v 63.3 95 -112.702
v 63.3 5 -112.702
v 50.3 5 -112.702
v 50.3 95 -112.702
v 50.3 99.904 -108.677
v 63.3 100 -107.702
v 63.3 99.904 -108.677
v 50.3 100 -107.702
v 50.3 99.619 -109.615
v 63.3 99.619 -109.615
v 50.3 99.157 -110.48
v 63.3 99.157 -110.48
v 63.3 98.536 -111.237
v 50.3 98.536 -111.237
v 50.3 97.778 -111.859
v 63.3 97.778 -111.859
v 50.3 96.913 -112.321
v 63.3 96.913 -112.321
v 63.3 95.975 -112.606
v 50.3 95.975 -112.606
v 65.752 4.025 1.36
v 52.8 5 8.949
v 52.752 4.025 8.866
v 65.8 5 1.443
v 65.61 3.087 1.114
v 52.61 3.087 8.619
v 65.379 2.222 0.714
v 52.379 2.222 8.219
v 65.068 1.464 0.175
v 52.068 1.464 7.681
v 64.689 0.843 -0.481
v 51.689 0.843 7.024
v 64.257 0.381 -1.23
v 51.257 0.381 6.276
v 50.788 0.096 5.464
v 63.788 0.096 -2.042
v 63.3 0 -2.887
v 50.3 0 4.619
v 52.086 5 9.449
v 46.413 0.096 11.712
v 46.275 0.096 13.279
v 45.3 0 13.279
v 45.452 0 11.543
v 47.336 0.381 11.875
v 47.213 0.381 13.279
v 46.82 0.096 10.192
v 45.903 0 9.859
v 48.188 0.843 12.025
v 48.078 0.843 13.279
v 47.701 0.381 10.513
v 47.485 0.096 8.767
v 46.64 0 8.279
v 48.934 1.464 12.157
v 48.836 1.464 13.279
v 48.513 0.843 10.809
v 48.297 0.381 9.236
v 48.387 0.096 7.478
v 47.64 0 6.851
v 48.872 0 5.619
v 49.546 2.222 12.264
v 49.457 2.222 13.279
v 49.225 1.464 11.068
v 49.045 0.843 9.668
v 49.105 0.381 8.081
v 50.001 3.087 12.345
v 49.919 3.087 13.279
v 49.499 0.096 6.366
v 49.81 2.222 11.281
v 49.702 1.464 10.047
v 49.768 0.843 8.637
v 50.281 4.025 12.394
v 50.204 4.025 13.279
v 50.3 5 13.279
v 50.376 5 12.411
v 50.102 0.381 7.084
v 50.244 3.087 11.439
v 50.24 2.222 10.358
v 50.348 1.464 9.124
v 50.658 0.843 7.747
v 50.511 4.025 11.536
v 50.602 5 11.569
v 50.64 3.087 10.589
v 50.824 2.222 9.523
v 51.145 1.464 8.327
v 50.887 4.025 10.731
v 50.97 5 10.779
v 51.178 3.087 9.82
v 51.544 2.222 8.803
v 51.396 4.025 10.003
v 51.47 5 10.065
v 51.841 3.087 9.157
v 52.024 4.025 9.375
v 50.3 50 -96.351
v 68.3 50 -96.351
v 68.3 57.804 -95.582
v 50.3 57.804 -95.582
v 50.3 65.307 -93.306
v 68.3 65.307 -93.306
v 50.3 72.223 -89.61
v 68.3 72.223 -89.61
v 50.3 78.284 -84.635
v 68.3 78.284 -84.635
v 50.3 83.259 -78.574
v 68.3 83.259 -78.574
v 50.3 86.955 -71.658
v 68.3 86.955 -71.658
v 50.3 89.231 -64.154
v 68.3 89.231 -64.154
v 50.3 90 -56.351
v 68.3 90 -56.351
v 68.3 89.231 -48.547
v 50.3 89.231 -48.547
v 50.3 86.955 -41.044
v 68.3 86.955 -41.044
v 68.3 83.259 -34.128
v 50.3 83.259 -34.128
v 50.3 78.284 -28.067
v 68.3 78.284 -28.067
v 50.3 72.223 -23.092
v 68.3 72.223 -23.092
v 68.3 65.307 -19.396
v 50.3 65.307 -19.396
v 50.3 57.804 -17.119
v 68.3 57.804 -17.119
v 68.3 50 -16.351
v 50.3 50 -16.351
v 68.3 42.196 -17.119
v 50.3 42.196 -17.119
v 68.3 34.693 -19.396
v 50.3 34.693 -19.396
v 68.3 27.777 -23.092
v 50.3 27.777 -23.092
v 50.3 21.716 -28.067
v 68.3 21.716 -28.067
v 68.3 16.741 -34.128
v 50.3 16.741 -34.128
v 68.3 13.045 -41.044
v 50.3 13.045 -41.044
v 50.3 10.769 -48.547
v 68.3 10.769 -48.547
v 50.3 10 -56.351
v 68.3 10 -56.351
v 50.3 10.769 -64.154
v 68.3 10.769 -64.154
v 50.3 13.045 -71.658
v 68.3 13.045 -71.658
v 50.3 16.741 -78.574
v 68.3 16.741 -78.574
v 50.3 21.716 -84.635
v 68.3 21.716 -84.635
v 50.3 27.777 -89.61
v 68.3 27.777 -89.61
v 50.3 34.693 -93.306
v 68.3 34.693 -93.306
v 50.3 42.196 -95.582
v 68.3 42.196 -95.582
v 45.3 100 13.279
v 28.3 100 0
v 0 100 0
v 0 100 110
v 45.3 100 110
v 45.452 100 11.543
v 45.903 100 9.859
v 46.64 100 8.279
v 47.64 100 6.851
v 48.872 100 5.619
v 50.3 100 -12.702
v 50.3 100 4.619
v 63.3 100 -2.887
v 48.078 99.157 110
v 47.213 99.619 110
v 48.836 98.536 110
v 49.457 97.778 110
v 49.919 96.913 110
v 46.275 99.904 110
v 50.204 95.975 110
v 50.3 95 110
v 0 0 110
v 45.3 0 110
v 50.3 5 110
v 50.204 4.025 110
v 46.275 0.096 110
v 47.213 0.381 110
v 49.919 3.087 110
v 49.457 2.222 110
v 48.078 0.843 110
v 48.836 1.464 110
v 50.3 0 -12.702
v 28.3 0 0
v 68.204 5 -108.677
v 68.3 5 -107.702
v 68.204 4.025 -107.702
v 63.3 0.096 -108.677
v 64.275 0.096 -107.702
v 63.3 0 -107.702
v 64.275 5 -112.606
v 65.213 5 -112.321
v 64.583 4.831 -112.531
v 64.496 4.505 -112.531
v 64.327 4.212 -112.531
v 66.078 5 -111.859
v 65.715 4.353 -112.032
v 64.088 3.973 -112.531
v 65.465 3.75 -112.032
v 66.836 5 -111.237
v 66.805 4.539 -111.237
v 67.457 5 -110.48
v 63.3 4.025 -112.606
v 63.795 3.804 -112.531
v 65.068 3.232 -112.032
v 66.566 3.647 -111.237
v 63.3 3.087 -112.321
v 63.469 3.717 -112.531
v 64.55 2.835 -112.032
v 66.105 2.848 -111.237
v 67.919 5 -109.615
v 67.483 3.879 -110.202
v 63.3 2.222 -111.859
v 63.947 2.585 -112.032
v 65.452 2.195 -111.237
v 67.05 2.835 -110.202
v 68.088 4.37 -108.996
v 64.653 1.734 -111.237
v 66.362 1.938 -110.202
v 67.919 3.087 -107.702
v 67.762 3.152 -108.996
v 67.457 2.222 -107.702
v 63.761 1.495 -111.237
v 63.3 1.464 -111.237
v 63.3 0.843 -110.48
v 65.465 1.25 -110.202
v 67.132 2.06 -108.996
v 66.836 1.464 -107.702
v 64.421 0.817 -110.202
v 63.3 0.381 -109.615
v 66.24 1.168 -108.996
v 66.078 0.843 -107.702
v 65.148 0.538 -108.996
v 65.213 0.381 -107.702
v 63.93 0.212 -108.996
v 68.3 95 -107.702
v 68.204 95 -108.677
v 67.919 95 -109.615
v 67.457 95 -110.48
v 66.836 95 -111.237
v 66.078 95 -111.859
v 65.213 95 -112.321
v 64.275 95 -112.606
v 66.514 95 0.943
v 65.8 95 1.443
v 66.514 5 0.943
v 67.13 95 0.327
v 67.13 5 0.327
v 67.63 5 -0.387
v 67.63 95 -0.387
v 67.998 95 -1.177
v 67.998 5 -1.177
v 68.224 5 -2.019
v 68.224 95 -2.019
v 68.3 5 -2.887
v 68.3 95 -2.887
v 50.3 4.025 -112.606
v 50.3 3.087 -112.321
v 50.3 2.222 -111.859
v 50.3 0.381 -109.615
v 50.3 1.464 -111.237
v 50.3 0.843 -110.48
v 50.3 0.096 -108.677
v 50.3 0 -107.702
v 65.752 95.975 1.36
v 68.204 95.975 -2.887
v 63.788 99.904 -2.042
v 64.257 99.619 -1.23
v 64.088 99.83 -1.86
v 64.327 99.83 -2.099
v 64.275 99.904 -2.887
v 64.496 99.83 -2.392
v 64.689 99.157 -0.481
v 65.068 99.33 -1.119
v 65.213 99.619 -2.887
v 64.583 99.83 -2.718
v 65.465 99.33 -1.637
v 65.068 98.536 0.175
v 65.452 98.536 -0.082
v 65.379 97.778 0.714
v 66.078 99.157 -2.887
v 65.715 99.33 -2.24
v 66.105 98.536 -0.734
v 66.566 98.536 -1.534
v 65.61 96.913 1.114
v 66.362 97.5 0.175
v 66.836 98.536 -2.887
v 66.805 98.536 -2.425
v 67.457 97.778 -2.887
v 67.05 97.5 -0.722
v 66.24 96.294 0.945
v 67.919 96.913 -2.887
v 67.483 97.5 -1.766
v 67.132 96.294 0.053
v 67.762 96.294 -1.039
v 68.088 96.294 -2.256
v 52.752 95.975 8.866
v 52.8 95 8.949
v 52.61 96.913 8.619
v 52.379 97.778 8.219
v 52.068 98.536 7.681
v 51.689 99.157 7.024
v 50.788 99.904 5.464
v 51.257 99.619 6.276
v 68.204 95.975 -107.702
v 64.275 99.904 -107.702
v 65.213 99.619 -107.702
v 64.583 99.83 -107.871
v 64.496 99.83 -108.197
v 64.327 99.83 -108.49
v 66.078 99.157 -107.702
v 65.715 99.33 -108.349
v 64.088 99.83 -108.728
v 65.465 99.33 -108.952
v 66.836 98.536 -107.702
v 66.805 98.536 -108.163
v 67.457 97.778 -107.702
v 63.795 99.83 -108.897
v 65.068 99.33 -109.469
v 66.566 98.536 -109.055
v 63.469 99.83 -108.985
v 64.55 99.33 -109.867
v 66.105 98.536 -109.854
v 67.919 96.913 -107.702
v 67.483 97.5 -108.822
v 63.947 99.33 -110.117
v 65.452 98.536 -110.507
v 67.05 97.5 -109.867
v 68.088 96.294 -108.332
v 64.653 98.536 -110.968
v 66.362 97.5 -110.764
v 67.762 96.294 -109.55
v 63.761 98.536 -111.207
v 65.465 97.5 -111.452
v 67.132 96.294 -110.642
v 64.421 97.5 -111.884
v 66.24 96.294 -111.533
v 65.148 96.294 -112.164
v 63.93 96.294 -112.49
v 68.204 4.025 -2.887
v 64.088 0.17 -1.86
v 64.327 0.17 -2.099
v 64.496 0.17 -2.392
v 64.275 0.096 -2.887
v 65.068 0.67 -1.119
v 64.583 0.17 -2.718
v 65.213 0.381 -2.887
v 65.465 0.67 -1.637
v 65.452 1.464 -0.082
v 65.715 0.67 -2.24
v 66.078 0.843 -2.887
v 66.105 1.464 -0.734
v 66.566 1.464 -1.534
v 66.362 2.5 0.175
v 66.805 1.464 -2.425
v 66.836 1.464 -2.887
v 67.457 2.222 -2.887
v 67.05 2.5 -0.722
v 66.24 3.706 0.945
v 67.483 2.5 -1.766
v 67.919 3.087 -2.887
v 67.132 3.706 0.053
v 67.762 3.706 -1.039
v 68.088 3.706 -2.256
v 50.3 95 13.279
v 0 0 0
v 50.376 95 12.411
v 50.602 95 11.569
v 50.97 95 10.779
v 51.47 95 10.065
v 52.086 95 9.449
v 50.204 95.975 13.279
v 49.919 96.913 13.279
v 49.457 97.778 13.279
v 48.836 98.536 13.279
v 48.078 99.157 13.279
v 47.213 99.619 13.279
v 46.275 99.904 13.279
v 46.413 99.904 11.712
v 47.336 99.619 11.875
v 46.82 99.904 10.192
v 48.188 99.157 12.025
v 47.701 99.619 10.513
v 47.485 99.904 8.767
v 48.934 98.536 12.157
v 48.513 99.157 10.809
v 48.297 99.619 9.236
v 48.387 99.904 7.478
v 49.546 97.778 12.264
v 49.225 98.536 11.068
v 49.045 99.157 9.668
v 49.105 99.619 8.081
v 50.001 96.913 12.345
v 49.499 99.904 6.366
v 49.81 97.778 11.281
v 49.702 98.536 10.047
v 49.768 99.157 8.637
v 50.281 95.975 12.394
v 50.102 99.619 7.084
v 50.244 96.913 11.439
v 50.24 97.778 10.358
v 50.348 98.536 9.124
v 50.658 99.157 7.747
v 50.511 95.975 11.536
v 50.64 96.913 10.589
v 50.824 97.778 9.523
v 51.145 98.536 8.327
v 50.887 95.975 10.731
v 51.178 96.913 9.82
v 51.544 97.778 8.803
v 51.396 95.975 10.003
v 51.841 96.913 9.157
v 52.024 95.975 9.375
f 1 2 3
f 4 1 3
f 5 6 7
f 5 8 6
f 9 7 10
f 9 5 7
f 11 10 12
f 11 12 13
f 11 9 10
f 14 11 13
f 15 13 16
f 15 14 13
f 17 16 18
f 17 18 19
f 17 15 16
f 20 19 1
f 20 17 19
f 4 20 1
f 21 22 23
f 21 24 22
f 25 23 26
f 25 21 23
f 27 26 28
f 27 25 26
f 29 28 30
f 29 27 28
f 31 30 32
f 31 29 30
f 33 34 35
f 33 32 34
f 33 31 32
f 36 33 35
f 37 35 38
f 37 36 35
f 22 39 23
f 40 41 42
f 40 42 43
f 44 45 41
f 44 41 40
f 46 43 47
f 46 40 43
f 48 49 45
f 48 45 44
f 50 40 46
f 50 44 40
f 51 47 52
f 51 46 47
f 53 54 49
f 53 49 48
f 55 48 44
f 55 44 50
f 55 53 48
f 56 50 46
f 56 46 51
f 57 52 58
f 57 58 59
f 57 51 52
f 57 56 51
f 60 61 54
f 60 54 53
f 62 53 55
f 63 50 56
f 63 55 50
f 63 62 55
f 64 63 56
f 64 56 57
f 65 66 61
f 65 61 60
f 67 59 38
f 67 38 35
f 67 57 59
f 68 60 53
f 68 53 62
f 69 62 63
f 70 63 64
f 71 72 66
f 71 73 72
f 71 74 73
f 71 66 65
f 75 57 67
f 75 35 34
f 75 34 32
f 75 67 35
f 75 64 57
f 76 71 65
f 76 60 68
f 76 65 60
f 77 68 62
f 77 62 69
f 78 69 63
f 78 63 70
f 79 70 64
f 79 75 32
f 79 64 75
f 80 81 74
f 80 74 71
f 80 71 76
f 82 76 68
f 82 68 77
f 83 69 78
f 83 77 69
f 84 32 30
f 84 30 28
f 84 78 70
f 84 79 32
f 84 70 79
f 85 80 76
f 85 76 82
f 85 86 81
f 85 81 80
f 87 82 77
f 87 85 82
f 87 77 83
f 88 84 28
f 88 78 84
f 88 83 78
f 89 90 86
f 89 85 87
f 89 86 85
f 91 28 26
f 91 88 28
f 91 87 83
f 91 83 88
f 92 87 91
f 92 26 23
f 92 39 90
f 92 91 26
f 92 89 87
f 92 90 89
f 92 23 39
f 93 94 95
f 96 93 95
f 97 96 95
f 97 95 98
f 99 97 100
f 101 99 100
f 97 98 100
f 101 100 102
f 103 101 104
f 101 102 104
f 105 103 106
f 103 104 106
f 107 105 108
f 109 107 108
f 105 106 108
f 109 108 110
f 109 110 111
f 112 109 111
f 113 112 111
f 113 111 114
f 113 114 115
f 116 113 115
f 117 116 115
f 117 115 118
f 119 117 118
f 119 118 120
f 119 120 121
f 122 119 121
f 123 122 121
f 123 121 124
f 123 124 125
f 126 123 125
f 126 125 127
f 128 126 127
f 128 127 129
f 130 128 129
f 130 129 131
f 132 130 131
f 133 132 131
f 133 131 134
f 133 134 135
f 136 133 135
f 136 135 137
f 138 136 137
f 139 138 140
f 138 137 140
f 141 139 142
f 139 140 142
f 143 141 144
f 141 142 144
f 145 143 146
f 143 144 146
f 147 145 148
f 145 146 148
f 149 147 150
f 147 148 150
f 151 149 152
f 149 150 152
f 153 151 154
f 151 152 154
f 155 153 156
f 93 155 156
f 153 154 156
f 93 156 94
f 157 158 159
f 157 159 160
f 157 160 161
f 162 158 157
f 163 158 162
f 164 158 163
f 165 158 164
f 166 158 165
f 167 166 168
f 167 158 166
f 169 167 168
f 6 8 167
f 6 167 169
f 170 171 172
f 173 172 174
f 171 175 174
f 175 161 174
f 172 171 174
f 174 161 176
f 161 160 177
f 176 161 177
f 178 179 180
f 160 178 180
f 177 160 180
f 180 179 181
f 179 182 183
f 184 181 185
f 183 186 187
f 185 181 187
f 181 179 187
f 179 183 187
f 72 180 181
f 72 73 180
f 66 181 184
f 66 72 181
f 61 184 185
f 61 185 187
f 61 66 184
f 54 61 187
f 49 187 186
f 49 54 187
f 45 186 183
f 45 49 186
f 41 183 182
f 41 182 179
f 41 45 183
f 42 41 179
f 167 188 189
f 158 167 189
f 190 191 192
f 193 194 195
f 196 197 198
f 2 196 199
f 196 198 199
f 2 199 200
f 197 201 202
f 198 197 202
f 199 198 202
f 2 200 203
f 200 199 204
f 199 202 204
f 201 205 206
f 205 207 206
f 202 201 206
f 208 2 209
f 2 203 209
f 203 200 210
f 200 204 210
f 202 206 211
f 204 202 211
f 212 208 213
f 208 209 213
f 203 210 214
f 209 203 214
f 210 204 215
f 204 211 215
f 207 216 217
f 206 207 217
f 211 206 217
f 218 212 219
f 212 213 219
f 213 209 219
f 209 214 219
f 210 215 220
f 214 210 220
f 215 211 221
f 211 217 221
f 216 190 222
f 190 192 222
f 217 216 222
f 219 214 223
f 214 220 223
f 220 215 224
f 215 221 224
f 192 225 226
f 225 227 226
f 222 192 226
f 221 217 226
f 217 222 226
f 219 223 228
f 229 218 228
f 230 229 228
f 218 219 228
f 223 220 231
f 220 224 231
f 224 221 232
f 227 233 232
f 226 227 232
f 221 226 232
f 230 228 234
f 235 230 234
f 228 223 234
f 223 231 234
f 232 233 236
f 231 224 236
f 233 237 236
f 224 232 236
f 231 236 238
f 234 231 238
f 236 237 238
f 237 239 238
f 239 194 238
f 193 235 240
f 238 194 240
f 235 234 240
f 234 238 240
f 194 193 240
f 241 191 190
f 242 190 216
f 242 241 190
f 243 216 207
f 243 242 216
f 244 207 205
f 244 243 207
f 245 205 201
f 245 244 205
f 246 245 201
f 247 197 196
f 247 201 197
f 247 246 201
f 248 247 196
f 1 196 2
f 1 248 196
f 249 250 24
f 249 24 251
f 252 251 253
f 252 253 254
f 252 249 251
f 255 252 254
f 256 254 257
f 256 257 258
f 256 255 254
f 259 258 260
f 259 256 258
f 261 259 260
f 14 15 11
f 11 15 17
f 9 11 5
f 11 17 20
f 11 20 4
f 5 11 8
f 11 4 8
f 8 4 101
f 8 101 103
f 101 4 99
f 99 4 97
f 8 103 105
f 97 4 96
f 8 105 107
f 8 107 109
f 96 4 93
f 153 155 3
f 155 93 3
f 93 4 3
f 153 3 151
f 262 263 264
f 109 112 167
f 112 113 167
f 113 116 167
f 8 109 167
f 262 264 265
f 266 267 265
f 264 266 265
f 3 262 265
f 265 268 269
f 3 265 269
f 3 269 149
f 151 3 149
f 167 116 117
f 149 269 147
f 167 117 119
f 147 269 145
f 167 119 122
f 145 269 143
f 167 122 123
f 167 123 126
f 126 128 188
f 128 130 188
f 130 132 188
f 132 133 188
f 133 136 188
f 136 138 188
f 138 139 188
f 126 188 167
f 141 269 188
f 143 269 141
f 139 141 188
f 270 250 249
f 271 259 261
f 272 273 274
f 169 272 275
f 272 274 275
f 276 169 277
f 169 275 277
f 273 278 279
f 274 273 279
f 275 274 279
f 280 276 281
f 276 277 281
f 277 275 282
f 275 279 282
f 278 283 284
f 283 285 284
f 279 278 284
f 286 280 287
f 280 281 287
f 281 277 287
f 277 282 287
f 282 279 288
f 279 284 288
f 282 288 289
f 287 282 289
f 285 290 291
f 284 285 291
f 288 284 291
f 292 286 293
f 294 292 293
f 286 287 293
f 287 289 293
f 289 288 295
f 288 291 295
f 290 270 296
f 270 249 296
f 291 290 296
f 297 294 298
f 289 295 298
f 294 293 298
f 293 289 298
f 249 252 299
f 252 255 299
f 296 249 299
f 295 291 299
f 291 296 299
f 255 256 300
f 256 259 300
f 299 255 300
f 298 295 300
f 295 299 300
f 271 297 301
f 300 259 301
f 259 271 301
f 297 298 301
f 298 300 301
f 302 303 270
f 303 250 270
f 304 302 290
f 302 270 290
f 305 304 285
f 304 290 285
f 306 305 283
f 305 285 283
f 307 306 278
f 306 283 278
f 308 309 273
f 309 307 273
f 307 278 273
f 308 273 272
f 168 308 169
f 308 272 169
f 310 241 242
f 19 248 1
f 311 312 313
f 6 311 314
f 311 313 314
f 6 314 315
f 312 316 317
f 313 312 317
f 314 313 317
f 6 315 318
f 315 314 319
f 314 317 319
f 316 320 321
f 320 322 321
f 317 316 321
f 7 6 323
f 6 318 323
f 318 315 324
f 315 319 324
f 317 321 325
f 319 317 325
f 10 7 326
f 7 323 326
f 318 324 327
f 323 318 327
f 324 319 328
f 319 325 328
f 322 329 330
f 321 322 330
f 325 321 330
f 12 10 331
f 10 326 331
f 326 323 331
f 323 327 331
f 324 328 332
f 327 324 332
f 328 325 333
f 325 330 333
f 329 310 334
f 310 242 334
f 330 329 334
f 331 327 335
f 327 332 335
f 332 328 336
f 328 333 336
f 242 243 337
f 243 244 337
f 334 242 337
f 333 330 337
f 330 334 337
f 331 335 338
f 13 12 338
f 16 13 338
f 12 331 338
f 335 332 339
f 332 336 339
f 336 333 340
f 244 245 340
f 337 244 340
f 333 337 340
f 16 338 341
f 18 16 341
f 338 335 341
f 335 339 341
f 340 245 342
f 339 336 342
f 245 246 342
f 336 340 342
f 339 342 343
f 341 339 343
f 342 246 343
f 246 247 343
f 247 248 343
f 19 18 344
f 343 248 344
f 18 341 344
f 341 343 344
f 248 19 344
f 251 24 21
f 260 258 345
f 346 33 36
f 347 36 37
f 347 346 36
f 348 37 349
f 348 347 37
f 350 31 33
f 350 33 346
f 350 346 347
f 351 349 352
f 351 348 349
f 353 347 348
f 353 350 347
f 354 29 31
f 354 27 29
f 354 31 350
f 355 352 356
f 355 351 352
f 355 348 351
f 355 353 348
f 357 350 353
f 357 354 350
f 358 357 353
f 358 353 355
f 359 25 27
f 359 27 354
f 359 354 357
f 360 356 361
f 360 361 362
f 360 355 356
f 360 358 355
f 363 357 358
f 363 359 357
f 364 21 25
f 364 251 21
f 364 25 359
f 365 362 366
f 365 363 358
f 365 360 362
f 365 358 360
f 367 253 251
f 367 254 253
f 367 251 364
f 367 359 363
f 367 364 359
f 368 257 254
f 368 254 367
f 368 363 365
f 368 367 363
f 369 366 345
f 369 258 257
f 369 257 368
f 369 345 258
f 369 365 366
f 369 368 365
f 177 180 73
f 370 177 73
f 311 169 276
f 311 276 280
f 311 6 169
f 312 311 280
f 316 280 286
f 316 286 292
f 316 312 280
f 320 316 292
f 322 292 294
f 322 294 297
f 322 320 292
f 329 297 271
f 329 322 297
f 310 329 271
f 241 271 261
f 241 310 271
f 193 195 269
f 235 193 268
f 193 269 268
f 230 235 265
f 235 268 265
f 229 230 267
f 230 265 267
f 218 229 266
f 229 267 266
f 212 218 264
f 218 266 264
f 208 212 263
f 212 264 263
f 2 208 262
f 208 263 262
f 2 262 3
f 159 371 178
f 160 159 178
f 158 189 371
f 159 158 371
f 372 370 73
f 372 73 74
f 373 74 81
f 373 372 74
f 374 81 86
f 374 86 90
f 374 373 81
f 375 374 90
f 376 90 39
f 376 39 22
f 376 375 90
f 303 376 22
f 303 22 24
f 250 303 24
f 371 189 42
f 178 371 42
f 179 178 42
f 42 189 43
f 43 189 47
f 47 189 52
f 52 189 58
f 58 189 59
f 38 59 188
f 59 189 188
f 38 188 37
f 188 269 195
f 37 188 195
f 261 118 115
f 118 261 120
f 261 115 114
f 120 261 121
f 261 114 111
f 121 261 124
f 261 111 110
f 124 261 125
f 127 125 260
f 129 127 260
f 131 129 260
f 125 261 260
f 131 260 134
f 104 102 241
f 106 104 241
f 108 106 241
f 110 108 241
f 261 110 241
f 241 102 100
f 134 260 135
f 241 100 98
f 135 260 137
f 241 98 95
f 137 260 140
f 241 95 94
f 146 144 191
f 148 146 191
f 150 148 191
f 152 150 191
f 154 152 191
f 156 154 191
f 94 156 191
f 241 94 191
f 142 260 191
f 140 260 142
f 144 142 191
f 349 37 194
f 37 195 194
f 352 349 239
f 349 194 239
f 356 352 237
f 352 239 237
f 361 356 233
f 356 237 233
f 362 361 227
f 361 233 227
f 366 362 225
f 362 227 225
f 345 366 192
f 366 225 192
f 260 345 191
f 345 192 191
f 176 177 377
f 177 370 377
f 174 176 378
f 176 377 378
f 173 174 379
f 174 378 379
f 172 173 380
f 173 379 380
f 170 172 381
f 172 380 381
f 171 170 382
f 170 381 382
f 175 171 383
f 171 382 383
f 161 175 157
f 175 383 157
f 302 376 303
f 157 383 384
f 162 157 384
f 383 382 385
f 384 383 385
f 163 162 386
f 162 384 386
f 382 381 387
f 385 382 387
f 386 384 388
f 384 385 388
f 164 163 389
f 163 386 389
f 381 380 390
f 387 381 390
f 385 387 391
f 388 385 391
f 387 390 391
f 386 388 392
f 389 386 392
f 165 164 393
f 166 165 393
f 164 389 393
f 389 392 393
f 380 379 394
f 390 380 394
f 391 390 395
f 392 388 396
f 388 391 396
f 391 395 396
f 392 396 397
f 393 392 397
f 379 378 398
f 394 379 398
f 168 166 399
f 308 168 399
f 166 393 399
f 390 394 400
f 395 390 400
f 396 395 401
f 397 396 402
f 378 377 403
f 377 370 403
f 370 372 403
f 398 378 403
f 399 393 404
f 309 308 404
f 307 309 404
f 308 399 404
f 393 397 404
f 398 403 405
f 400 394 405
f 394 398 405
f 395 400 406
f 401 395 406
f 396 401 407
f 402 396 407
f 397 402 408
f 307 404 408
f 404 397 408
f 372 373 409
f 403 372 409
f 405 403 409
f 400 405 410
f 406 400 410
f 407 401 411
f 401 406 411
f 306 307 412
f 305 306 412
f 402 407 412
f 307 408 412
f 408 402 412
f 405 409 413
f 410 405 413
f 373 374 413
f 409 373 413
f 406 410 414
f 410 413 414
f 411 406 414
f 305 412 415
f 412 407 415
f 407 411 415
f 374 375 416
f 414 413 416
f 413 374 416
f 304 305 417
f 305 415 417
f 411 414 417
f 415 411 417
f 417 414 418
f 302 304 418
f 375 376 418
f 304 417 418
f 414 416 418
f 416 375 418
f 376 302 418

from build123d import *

# Parameters (mm, degrees)
BOSS_EXTRUDE1_DEPTH = 100
CUT_EXTRUDE1_REACH  = 167.428
SKETCH2_R           = 40
FILLET2_R           = 5


with BuildPart() as part:
    # Sketch1 → Boss-Extrude1 (new body)
    with BuildSketch(Plane(origin=(0, 0, 0), x_dir=(1, 0, 0), z_dir=(0, 1, 0))):
        Polygon((50.3, -110), (50.3, -10.392304845), (68.3, 0), (68.3, 112.701705922), (50.3, 112.701705922), (50.3, 12.701705922), (28.3, 0), (0, 0), (0, -110), align=None)
    extrude(amount=BOSS_EXTRUDE1_DEPTH)

    # Sketch2 → Cut-Extrude1 (cut, up to next)
    with BuildSketch(Plane(origin=(68.3, 0, 0), x_dir=(0, 0, -1), z_dir=(1, 0, 0)), mode=Mode.PRIVATE) as cut_extrude1_sk1:
        with Locations((56.350852961, 50)):
            Circle(SKETCH2_R)
    cut_extrude1_tool1 = extrude(cut_extrude1_sk1.sketch, amount=-CUT_EXTRUDE1_REACH, mode=Mode.PRIVATE) & part.part
    add(cut_extrude1_tool1.solids().sort_by_distance((68.3, 50, -56.350853))[0], mode=Mode.SUBTRACT)

    # Fillet2
    fillet2_edges = [part.edges().sort_by_distance(p)[0] for p in [
        (50.3, 0, 60.196152423),
        (50.3, 100, 60.196152423),
        (59.3, 0, 5.196152423),
        (59.3, 100, 5.196152423),
        (68.3, 0, -56.350852961),
        (68.3, 50, -112.701705922),
        (68.3, 100, -56.350852961),
        (68.3, 50, 0),
        (50.3, 50, 10.392304845),
        (59.3, 0, -112.701705922),
        (59.3, 100, -112.701705922),
    ]]
    fillet(fillet2_edges, radius=FILLET2_R)


solid = part.part
